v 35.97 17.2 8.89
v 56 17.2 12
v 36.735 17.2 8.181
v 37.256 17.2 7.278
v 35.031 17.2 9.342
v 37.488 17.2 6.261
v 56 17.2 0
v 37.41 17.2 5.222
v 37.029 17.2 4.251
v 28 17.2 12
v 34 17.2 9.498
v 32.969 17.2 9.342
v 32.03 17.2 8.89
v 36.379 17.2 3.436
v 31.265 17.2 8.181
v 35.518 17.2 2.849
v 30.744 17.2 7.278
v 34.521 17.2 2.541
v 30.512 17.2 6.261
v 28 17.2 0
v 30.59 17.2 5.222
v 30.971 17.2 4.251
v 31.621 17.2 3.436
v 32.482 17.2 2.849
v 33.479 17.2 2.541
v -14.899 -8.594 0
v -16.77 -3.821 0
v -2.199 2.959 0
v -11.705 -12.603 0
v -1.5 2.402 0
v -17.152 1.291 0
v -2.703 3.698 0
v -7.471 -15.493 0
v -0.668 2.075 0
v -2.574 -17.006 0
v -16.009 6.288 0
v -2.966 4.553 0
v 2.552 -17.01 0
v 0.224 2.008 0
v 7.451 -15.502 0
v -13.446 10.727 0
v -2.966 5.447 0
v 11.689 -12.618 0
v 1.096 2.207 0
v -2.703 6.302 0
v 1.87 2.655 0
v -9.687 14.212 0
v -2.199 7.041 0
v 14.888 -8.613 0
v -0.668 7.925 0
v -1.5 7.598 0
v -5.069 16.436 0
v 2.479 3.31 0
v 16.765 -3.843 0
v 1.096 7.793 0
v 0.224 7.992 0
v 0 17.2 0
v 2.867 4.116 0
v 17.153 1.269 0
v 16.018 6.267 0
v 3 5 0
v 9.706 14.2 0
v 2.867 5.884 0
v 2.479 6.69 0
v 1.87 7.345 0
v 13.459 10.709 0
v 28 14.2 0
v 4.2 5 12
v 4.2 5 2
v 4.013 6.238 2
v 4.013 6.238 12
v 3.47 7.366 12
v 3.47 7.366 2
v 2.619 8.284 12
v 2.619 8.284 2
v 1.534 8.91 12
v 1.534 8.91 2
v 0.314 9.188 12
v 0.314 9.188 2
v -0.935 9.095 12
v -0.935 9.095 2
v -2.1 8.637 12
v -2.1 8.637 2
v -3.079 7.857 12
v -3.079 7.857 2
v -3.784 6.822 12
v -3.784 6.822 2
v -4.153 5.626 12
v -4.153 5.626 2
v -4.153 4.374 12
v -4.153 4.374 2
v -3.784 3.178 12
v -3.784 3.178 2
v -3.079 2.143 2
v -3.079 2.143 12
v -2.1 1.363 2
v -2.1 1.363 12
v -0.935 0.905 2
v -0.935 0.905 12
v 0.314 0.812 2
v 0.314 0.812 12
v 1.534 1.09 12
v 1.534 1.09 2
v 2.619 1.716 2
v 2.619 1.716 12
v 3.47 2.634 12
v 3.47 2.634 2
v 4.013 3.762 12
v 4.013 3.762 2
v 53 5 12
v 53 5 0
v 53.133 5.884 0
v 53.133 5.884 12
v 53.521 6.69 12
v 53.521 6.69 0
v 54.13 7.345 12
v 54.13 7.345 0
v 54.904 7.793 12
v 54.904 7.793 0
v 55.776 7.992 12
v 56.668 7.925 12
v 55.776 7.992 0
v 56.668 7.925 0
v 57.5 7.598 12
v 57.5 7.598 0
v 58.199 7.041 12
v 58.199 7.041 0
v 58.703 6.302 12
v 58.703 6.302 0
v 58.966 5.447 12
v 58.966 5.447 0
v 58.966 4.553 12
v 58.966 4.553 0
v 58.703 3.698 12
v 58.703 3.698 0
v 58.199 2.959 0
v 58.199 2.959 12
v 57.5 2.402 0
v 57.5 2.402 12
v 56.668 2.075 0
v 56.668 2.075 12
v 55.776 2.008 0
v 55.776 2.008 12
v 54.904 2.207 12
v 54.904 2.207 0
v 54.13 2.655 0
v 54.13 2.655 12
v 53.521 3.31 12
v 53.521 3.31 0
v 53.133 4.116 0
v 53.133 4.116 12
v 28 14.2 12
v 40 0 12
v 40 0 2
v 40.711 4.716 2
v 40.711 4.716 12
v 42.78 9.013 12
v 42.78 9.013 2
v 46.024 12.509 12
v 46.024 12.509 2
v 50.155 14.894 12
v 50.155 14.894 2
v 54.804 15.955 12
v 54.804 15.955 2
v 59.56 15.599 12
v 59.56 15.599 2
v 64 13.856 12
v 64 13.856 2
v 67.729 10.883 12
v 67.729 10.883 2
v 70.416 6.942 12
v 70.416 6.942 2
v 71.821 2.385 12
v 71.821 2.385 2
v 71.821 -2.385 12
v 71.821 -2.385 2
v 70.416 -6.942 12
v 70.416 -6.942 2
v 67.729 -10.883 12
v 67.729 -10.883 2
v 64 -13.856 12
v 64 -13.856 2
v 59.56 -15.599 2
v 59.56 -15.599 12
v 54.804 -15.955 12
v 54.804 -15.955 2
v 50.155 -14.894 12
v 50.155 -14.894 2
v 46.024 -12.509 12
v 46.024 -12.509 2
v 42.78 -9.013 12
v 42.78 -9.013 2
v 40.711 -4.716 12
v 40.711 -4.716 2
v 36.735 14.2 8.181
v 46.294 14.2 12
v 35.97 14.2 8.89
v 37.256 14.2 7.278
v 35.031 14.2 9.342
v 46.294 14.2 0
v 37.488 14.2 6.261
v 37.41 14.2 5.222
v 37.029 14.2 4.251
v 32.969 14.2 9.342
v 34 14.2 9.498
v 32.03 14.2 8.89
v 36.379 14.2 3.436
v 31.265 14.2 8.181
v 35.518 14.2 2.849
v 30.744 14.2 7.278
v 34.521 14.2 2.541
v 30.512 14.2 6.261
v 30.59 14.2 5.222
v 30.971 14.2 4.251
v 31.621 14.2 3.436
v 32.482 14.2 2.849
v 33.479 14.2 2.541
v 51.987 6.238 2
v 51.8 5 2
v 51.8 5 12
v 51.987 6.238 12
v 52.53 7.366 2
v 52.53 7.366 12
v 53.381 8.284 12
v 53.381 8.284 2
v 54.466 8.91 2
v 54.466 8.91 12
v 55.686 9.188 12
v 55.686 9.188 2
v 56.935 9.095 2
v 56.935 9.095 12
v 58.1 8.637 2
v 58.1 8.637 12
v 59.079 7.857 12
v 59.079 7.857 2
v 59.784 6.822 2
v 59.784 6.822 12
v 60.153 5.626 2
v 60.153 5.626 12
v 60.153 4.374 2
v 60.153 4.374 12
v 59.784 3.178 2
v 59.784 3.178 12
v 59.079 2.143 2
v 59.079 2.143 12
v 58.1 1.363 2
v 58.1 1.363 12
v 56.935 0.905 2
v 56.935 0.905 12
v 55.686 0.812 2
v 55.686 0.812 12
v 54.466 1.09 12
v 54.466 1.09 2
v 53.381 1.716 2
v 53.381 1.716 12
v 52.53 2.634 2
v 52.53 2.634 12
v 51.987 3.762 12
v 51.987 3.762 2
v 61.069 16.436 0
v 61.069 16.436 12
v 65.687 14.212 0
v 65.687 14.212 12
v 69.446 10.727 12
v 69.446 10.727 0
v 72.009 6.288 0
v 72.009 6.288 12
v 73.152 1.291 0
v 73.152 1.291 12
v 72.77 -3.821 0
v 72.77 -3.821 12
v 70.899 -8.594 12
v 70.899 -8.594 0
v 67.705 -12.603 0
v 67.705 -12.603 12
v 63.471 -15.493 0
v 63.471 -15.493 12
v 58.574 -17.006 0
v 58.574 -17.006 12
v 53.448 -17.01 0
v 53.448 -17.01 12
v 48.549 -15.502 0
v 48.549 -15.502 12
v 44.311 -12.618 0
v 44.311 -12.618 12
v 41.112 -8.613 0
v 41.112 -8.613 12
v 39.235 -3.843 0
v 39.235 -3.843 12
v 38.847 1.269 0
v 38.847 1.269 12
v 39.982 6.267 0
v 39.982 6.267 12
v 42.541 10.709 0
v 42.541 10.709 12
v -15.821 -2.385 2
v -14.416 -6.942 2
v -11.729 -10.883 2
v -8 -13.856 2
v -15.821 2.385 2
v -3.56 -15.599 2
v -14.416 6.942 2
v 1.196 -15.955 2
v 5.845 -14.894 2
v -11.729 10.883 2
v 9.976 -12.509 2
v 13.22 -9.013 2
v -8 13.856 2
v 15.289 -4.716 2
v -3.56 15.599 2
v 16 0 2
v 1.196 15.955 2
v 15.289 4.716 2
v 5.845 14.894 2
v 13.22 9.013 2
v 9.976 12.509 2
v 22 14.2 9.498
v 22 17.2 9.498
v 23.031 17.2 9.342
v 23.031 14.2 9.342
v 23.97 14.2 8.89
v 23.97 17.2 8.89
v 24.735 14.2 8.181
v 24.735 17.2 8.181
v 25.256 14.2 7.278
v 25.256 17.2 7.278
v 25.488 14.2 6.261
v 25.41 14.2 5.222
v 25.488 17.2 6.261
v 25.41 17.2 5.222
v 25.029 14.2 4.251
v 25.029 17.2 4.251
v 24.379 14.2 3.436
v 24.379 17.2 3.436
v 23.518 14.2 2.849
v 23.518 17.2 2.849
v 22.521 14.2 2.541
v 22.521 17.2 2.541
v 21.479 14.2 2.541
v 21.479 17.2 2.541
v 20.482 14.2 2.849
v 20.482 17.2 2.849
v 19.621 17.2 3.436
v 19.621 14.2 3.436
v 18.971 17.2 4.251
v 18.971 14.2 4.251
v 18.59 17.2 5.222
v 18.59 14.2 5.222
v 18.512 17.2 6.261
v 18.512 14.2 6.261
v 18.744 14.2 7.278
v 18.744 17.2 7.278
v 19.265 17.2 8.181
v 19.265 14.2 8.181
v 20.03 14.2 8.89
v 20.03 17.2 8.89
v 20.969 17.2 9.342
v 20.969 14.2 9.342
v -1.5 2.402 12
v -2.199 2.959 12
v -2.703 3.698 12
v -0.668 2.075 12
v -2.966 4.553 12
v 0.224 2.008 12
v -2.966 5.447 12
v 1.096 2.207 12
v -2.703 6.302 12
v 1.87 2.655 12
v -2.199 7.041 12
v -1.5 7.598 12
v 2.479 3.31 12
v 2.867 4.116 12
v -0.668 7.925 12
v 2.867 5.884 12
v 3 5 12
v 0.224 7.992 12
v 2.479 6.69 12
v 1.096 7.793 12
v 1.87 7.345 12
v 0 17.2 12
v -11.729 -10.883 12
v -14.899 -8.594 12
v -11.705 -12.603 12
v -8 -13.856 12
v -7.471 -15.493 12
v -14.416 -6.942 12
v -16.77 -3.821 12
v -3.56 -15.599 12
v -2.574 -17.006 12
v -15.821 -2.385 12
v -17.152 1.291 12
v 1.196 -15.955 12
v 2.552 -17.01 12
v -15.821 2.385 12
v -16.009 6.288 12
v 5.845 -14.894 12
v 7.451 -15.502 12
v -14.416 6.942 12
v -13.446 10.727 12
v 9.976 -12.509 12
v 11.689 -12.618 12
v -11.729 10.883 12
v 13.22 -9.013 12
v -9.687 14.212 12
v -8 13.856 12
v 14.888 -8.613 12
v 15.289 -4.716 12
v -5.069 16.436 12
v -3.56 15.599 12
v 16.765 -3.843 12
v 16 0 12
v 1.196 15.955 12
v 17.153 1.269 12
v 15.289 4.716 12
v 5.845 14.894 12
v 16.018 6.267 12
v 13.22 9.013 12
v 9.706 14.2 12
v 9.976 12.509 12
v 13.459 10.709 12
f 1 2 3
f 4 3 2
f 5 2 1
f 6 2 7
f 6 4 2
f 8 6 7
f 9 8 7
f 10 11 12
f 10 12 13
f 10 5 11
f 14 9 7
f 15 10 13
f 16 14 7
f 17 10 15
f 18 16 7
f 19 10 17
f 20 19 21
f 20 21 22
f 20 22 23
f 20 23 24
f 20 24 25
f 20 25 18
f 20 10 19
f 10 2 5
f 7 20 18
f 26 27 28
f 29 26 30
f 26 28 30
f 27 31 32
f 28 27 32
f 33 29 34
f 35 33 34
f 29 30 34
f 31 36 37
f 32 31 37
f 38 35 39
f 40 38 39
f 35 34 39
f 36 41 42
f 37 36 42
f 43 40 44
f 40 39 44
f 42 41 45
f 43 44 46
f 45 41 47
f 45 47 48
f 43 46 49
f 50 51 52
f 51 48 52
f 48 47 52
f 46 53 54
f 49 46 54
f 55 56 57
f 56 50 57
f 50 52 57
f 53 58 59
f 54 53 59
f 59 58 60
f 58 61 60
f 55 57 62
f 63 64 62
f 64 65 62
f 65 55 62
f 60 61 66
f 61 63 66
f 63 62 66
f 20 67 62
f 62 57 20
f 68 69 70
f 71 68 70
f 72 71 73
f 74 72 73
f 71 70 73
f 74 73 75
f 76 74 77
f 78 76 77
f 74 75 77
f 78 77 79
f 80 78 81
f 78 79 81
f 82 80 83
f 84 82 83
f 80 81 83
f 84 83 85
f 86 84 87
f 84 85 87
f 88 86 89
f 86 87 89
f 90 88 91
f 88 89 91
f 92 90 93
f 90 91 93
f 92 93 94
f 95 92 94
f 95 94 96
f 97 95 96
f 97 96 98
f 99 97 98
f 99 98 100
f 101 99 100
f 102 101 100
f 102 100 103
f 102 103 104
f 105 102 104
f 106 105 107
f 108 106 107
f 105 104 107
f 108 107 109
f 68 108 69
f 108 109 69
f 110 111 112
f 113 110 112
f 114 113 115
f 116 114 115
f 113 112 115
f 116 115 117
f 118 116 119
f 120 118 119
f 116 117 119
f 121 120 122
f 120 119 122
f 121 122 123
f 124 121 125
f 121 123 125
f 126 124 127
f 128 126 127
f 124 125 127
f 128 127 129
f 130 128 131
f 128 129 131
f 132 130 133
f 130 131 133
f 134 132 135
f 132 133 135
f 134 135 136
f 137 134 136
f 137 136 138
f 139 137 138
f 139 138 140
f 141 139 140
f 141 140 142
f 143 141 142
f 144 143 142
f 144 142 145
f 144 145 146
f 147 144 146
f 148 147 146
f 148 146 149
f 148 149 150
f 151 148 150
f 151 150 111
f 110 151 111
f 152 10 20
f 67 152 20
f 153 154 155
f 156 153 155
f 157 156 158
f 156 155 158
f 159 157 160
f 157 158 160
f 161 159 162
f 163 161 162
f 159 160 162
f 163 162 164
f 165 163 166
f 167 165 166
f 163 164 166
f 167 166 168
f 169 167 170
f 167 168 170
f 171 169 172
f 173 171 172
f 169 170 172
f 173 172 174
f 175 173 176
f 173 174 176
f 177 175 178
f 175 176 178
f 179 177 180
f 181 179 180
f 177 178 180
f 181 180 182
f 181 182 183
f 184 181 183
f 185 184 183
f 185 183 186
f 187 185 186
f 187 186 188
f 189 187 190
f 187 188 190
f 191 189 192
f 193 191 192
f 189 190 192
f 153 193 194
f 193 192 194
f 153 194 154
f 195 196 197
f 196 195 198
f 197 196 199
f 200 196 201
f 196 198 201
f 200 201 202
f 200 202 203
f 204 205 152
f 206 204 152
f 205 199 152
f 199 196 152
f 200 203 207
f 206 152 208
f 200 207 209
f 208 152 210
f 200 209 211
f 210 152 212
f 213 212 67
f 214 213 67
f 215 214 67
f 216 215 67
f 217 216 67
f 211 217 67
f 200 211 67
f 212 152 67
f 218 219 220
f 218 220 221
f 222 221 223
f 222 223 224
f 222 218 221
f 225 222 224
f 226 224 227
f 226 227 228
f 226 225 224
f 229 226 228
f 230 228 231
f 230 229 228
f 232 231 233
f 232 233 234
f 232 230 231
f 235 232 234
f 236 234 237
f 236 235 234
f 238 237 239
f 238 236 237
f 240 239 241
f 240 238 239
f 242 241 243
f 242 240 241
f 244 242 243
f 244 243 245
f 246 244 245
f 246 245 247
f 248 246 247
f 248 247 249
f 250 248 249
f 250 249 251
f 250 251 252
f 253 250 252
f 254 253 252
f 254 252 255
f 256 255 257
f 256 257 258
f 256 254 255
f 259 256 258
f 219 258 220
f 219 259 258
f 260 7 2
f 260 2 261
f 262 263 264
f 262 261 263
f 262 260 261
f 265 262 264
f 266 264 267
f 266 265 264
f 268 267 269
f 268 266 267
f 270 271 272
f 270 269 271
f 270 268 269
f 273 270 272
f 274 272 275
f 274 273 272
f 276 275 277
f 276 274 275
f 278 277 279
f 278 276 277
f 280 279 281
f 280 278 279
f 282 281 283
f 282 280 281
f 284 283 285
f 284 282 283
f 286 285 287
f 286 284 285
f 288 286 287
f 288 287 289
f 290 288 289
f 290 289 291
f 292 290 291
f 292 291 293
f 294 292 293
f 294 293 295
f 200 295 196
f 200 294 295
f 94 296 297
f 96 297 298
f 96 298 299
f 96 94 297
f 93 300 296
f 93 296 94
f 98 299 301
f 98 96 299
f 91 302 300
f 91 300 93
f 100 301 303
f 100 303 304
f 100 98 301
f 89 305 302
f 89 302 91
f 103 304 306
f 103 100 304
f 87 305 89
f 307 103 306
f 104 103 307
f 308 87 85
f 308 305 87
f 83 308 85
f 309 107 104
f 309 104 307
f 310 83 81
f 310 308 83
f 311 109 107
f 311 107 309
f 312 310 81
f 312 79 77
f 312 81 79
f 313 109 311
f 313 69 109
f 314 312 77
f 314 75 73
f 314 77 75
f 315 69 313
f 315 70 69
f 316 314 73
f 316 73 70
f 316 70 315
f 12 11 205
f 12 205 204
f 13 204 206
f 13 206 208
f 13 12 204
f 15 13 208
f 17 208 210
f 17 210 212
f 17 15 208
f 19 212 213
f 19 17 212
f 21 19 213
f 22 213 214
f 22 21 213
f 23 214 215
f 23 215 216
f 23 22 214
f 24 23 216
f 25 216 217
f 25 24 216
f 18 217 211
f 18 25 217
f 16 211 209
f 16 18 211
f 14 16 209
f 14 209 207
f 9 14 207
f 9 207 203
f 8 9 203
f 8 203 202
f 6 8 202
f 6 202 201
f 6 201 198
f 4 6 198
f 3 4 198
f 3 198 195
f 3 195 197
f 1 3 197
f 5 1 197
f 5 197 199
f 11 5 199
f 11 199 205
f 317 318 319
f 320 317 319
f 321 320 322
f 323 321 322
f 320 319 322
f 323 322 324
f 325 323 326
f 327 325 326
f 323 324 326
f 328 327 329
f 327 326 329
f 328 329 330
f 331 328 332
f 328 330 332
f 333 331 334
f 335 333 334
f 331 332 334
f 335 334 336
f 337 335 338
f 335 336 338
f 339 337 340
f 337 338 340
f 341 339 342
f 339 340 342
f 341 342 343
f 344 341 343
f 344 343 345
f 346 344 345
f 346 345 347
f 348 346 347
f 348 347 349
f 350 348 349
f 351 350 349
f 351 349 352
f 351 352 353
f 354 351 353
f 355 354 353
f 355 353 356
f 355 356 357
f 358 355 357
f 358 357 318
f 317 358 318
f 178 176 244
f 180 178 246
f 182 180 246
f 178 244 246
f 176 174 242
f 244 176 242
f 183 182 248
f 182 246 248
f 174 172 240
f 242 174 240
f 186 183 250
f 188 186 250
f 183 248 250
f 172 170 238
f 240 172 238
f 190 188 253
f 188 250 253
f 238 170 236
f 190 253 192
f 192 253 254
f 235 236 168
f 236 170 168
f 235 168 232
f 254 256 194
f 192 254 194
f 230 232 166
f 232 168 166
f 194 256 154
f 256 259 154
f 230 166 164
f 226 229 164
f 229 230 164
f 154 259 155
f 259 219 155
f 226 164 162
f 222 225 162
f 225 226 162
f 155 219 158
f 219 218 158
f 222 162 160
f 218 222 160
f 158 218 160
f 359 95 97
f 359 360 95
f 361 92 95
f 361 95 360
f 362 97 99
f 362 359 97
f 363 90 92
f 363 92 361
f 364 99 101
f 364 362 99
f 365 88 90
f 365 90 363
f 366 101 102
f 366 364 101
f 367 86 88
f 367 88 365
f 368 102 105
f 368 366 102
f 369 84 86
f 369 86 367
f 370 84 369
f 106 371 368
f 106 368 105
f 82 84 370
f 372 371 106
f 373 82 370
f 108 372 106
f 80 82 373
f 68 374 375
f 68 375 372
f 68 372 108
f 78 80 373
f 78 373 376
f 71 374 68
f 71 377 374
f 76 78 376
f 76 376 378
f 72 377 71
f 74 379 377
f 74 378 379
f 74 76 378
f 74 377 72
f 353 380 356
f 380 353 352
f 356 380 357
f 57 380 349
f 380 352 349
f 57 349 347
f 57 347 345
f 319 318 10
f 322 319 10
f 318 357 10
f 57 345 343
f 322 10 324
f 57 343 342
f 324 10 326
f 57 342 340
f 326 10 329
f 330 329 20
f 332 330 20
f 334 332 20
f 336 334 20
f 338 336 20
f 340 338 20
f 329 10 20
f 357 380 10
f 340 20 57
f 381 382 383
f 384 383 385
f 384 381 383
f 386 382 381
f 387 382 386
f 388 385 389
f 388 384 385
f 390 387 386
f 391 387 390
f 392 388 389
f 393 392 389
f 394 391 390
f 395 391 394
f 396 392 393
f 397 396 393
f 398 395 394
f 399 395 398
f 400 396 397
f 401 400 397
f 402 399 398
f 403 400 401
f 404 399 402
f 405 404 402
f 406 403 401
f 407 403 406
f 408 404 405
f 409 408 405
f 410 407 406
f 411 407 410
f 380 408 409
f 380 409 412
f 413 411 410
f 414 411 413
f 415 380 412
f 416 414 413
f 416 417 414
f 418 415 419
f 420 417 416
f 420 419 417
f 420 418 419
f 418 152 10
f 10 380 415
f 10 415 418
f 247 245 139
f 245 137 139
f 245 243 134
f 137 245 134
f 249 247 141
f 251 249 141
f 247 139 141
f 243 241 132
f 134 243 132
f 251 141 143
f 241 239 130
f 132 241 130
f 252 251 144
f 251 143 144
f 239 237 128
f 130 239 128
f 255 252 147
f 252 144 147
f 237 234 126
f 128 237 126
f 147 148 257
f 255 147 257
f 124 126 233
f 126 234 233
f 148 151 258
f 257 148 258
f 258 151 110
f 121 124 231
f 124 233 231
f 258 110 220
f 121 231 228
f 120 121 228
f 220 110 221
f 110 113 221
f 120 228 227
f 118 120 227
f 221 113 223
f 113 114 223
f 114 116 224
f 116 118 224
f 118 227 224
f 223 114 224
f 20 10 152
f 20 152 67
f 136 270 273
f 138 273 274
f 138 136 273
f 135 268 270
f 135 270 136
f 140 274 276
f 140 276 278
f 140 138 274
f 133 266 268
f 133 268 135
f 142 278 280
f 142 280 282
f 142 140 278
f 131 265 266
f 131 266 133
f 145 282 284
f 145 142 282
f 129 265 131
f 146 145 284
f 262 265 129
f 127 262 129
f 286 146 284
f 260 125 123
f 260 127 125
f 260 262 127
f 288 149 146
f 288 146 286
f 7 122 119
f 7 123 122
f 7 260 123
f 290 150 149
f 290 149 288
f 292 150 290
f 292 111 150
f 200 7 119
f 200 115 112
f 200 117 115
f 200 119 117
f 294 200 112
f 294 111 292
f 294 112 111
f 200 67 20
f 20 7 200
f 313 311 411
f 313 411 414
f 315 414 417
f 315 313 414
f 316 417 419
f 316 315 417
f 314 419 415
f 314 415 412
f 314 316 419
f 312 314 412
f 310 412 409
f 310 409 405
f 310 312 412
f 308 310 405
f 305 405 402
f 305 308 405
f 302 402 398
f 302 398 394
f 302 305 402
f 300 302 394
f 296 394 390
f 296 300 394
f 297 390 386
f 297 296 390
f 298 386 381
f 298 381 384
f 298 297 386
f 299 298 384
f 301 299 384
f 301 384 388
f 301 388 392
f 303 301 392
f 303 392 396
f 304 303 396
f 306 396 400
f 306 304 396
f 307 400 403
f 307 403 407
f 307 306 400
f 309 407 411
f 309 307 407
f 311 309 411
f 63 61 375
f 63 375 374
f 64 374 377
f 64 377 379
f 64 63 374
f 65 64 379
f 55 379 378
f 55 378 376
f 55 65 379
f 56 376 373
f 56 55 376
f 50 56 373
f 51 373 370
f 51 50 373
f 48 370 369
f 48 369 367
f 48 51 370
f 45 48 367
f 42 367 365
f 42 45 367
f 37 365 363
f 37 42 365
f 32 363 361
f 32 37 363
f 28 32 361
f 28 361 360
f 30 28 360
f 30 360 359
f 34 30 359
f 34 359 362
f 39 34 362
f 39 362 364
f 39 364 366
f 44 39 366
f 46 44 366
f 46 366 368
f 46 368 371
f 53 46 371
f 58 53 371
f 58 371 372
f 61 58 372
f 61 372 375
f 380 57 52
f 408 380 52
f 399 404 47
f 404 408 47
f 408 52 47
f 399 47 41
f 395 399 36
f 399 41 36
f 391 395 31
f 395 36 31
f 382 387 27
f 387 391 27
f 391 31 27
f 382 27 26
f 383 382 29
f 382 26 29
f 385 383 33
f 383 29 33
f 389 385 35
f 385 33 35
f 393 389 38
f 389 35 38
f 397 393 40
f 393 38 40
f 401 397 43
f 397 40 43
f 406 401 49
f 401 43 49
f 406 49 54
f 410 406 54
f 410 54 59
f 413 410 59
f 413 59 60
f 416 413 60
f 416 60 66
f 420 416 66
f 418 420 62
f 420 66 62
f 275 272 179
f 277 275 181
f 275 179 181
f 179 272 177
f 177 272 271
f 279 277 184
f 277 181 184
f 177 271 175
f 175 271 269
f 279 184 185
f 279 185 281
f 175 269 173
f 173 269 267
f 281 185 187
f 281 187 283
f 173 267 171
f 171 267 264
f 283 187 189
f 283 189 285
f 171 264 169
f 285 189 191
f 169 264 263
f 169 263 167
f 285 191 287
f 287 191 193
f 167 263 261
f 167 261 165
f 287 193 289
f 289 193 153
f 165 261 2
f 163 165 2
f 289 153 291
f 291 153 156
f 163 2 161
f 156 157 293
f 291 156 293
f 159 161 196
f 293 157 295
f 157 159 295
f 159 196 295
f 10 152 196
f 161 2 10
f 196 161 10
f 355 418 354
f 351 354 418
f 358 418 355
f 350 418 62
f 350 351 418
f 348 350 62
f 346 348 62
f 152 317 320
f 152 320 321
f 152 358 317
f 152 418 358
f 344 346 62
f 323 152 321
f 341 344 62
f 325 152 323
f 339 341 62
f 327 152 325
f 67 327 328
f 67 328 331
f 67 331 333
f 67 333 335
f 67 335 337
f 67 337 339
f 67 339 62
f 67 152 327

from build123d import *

# Parameters (mm, degrees)
SKETCH4_R                = 17.2
SKETCH4_R_2              = 3
BOSS_EXTRUDE3_DEPTH      = 2
SKETCH5_R                = 17.2
SKETCH5_R_2              = 16
SKETCH5_R_3              = 4.2
SKETCH5_R_4              = 3
BOSS_EXTRUDE4_DEPTH      = 10
BOSS_EXTRUDE5_REACH      = 51.829
BOSS_EXTRUDE5_END_RADIUS = 17.2
SKETCH6_W                = 12
SKETCH6_H                = 3
CUT_EXTRUDE1_REACH       = 47.95
SKETCH7_R                = 3.497879743


with BuildPart() as part:
    # Sketch4 → Boss-Extrude3 (new body)
    with BuildSketch(Plane.XY):
        Circle(SKETCH4_R)
        with Locations((0, 5)):
            Circle(SKETCH4_R_2, mode=Mode.SUBTRACT)
    extrude(amount=BOSS_EXTRUDE3_DEPTH)

    # Sketch5 → Boss-Extrude4 (add)
    # profile 1 of 2: a face of its own
    with BuildSketch(Plane.XY.offset(2)):
        Circle(SKETCH5_R)
        Circle(SKETCH5_R_2, mode=Mode.SUBTRACT)
    # profile 2 of 2: a face of its own
    with BuildSketch(Plane.XY.offset(2)):
        with Locations((0, 5)):
            Circle(SKETCH5_R_3)
        with Locations((0, 5)):
            Circle(SKETCH5_R_4, mode=Mode.SUBTRACT)
    extrude(amount=BOSS_EXTRUDE4_DEPTH)

    # Boss-Extrude5: up to this cylinder (the profile starts outside it)
    boss_extrude5_end = Plane(origin=(0, 0, 6), z_dir=(0, 0, -1)) * Cylinder(BOSS_EXTRUDE5_END_RADIUS, 139.058, mode=Mode.PRIVATE)
    # Sketch6 → Boss-Extrude5 (add, up to the surface)
    with BuildSketch(Plane(origin=(28, 0, 0), x_dir=(0, 0, -1), z_dir=(1, 0, 0)), mode=Mode.PRIVATE) as boss_extrude5_sk1:
        with Locations((-6, 15.7)):
            Rectangle(SKETCH6_W, SKETCH6_H)
    boss_extrude5_tool1 = extrude(boss_extrude5_sk1.sketch, amount=-BOSS_EXTRUDE5_REACH, mode=Mode.PRIVATE) - boss_extrude5_end
    add(boss_extrude5_tool1.solids().sort_by_distance((28, 15.7, 6))[0])

    # Sketch7 → Cut-Extrude1 (cut, up to next)
    with BuildSketch(Plane(origin=(0, 17.2, 0), x_dir=(1, 0, 0), z_dir=(0, 1, 0)), mode=Mode.PRIVATE) as cut_extrude1_sk1:
        with Locations(Location((22, -6, 0), (0, 0, 270))):
            Circle(SKETCH7_R)
    cut_extrude1_tool1 = extrude(cut_extrude1_sk1.sketch, amount=-CUT_EXTRUDE1_REACH, mode=Mode.PRIVATE) & part.part
    add(cut_extrude1_tool1.solids().sort_by_distance((22, 17.2, 6))[0], mode=Mode.SUBTRACT)


with BuildPart() as body_2:
    # Mirror1: mirrored copy
    add(part.part.mirror(Plane(origin=(28, 0, 0), x_dir=(0, 0, 1), z_dir=(1, 0, 0))))


solid = Compound([part.part, body_2.part])
